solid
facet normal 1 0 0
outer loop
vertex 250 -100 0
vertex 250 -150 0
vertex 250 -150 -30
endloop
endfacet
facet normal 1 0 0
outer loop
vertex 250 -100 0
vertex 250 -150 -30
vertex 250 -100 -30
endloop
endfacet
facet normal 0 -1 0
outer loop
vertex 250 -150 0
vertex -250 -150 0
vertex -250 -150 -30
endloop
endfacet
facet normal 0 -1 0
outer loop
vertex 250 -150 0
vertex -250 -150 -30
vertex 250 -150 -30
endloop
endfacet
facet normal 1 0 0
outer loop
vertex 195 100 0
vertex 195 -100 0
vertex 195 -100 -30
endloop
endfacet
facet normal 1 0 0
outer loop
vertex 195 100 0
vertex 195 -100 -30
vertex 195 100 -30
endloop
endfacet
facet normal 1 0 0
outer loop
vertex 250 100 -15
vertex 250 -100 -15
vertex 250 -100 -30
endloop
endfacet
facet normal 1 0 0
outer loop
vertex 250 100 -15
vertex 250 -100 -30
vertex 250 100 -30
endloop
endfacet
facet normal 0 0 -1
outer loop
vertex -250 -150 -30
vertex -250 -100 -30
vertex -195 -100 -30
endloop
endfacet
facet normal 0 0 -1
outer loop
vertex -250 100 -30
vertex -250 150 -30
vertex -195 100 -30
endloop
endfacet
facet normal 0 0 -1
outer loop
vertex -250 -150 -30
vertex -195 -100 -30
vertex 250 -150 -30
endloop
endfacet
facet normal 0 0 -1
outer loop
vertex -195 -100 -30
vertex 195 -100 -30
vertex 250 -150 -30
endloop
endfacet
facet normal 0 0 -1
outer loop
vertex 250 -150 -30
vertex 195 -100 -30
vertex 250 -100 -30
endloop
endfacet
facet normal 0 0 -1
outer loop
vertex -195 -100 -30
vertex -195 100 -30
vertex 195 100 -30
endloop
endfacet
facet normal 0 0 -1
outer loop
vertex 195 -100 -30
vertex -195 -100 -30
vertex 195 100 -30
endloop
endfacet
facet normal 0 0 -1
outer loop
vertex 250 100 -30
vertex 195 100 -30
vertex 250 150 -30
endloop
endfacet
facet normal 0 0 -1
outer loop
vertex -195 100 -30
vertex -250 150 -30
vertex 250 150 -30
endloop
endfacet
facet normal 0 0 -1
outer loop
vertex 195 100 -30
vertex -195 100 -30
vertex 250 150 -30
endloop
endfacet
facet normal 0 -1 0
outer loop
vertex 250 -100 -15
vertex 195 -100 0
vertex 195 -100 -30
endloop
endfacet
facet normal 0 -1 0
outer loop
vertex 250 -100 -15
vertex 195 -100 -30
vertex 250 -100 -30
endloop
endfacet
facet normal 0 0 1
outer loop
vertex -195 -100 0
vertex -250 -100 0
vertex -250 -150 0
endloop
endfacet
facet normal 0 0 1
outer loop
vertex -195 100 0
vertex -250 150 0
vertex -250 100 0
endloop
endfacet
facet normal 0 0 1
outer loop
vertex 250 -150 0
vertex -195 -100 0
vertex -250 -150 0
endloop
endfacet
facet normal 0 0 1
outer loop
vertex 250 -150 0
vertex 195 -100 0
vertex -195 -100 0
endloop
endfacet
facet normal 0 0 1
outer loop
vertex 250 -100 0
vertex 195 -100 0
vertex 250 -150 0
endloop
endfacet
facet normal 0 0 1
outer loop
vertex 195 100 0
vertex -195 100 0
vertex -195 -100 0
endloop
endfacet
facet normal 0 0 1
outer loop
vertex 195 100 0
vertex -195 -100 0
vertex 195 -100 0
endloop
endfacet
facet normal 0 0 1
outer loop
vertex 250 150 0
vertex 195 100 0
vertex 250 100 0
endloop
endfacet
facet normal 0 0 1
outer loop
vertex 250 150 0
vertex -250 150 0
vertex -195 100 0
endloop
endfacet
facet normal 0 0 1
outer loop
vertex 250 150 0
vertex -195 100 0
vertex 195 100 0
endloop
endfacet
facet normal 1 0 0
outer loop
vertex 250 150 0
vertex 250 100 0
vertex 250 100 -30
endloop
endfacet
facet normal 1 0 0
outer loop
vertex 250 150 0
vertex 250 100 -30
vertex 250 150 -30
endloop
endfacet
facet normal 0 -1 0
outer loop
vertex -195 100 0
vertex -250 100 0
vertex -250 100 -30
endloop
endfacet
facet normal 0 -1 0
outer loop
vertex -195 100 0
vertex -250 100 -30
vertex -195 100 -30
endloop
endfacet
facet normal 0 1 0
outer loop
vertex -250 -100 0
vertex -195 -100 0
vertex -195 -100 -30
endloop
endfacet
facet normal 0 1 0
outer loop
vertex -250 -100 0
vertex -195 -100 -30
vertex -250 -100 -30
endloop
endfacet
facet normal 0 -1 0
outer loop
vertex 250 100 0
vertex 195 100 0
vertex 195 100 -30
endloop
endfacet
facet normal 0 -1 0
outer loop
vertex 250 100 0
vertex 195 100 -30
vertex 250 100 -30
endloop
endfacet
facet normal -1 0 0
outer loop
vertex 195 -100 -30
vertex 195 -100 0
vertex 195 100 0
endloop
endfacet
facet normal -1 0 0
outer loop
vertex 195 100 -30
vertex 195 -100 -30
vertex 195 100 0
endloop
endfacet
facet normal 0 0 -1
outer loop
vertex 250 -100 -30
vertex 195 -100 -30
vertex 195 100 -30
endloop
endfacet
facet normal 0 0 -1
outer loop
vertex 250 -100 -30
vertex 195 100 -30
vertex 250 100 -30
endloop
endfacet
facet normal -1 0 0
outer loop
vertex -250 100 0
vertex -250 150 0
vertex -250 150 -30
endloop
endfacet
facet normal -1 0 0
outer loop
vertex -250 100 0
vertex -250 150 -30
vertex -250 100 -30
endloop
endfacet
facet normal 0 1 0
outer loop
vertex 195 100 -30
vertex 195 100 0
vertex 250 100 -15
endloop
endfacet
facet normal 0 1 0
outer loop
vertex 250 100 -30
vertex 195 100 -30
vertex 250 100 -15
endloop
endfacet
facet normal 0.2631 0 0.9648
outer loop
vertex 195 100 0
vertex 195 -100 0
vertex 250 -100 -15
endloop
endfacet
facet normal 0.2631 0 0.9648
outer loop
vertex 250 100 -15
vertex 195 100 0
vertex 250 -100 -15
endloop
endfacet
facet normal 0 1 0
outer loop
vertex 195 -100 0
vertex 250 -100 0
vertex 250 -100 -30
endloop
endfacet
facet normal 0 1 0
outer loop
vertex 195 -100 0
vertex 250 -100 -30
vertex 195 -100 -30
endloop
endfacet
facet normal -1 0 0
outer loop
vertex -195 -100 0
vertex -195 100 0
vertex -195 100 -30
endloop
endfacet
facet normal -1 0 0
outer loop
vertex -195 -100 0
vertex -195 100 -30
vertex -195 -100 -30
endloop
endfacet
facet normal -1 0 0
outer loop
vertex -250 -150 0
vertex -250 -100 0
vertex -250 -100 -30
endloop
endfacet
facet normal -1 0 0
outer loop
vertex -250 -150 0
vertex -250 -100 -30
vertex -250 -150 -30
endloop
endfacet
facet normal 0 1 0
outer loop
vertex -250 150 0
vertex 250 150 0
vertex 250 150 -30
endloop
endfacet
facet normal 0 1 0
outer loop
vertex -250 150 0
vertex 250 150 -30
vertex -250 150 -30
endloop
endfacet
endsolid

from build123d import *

# Parameters (mm, degrees)
F2_DEPTH      = 30
F0_W          = 55
F0_H          = 200
F3_DEPTH      = 30
F4_DEPTH      = 150.001
F4_DEPTH_BACK = 150.001


# Not quite as in the source:
# - a feature of the source that left no trace in its solid (it failed there, or was rolled back) is left out


with BuildPart() as f2:
    # F0 (on Top) → F2 (new body)
    with BuildSketch(Plane.XY):
        Polygon((250, 150), (-250, 150), (-250, 100), (-195, 100), (-195, -100), (-250, -100), (-250, -150), (250, -150), (250, -100), (195, -100), (195, 100), (250, 100), align=None)
    extrude(amount=-F2_DEPTH)


with BuildPart() as f3:
    # F0 (on Top) → F3 (new body, through all)
    with BuildSketch(Plane.XY):
        with Locations((222.5, 0)):
            Rectangle(F0_W, F0_H)
    extrude(amount=-F3_DEPTH)

    # F1 (on Front) → F4 (cut, two sides)
    with BuildSketch(Plane.XZ) as f4_sk:
        Polygon((250, -15), (250, 0), (195, 0), align=None)
    extrude(amount=-F4_DEPTH, mode=Mode.SUBTRACT)
    extrude(f4_sk.sketch, amount=F4_DEPTH_BACK, mode=Mode.SUBTRACT)


solid = Compound([f2.part, f3.part])
